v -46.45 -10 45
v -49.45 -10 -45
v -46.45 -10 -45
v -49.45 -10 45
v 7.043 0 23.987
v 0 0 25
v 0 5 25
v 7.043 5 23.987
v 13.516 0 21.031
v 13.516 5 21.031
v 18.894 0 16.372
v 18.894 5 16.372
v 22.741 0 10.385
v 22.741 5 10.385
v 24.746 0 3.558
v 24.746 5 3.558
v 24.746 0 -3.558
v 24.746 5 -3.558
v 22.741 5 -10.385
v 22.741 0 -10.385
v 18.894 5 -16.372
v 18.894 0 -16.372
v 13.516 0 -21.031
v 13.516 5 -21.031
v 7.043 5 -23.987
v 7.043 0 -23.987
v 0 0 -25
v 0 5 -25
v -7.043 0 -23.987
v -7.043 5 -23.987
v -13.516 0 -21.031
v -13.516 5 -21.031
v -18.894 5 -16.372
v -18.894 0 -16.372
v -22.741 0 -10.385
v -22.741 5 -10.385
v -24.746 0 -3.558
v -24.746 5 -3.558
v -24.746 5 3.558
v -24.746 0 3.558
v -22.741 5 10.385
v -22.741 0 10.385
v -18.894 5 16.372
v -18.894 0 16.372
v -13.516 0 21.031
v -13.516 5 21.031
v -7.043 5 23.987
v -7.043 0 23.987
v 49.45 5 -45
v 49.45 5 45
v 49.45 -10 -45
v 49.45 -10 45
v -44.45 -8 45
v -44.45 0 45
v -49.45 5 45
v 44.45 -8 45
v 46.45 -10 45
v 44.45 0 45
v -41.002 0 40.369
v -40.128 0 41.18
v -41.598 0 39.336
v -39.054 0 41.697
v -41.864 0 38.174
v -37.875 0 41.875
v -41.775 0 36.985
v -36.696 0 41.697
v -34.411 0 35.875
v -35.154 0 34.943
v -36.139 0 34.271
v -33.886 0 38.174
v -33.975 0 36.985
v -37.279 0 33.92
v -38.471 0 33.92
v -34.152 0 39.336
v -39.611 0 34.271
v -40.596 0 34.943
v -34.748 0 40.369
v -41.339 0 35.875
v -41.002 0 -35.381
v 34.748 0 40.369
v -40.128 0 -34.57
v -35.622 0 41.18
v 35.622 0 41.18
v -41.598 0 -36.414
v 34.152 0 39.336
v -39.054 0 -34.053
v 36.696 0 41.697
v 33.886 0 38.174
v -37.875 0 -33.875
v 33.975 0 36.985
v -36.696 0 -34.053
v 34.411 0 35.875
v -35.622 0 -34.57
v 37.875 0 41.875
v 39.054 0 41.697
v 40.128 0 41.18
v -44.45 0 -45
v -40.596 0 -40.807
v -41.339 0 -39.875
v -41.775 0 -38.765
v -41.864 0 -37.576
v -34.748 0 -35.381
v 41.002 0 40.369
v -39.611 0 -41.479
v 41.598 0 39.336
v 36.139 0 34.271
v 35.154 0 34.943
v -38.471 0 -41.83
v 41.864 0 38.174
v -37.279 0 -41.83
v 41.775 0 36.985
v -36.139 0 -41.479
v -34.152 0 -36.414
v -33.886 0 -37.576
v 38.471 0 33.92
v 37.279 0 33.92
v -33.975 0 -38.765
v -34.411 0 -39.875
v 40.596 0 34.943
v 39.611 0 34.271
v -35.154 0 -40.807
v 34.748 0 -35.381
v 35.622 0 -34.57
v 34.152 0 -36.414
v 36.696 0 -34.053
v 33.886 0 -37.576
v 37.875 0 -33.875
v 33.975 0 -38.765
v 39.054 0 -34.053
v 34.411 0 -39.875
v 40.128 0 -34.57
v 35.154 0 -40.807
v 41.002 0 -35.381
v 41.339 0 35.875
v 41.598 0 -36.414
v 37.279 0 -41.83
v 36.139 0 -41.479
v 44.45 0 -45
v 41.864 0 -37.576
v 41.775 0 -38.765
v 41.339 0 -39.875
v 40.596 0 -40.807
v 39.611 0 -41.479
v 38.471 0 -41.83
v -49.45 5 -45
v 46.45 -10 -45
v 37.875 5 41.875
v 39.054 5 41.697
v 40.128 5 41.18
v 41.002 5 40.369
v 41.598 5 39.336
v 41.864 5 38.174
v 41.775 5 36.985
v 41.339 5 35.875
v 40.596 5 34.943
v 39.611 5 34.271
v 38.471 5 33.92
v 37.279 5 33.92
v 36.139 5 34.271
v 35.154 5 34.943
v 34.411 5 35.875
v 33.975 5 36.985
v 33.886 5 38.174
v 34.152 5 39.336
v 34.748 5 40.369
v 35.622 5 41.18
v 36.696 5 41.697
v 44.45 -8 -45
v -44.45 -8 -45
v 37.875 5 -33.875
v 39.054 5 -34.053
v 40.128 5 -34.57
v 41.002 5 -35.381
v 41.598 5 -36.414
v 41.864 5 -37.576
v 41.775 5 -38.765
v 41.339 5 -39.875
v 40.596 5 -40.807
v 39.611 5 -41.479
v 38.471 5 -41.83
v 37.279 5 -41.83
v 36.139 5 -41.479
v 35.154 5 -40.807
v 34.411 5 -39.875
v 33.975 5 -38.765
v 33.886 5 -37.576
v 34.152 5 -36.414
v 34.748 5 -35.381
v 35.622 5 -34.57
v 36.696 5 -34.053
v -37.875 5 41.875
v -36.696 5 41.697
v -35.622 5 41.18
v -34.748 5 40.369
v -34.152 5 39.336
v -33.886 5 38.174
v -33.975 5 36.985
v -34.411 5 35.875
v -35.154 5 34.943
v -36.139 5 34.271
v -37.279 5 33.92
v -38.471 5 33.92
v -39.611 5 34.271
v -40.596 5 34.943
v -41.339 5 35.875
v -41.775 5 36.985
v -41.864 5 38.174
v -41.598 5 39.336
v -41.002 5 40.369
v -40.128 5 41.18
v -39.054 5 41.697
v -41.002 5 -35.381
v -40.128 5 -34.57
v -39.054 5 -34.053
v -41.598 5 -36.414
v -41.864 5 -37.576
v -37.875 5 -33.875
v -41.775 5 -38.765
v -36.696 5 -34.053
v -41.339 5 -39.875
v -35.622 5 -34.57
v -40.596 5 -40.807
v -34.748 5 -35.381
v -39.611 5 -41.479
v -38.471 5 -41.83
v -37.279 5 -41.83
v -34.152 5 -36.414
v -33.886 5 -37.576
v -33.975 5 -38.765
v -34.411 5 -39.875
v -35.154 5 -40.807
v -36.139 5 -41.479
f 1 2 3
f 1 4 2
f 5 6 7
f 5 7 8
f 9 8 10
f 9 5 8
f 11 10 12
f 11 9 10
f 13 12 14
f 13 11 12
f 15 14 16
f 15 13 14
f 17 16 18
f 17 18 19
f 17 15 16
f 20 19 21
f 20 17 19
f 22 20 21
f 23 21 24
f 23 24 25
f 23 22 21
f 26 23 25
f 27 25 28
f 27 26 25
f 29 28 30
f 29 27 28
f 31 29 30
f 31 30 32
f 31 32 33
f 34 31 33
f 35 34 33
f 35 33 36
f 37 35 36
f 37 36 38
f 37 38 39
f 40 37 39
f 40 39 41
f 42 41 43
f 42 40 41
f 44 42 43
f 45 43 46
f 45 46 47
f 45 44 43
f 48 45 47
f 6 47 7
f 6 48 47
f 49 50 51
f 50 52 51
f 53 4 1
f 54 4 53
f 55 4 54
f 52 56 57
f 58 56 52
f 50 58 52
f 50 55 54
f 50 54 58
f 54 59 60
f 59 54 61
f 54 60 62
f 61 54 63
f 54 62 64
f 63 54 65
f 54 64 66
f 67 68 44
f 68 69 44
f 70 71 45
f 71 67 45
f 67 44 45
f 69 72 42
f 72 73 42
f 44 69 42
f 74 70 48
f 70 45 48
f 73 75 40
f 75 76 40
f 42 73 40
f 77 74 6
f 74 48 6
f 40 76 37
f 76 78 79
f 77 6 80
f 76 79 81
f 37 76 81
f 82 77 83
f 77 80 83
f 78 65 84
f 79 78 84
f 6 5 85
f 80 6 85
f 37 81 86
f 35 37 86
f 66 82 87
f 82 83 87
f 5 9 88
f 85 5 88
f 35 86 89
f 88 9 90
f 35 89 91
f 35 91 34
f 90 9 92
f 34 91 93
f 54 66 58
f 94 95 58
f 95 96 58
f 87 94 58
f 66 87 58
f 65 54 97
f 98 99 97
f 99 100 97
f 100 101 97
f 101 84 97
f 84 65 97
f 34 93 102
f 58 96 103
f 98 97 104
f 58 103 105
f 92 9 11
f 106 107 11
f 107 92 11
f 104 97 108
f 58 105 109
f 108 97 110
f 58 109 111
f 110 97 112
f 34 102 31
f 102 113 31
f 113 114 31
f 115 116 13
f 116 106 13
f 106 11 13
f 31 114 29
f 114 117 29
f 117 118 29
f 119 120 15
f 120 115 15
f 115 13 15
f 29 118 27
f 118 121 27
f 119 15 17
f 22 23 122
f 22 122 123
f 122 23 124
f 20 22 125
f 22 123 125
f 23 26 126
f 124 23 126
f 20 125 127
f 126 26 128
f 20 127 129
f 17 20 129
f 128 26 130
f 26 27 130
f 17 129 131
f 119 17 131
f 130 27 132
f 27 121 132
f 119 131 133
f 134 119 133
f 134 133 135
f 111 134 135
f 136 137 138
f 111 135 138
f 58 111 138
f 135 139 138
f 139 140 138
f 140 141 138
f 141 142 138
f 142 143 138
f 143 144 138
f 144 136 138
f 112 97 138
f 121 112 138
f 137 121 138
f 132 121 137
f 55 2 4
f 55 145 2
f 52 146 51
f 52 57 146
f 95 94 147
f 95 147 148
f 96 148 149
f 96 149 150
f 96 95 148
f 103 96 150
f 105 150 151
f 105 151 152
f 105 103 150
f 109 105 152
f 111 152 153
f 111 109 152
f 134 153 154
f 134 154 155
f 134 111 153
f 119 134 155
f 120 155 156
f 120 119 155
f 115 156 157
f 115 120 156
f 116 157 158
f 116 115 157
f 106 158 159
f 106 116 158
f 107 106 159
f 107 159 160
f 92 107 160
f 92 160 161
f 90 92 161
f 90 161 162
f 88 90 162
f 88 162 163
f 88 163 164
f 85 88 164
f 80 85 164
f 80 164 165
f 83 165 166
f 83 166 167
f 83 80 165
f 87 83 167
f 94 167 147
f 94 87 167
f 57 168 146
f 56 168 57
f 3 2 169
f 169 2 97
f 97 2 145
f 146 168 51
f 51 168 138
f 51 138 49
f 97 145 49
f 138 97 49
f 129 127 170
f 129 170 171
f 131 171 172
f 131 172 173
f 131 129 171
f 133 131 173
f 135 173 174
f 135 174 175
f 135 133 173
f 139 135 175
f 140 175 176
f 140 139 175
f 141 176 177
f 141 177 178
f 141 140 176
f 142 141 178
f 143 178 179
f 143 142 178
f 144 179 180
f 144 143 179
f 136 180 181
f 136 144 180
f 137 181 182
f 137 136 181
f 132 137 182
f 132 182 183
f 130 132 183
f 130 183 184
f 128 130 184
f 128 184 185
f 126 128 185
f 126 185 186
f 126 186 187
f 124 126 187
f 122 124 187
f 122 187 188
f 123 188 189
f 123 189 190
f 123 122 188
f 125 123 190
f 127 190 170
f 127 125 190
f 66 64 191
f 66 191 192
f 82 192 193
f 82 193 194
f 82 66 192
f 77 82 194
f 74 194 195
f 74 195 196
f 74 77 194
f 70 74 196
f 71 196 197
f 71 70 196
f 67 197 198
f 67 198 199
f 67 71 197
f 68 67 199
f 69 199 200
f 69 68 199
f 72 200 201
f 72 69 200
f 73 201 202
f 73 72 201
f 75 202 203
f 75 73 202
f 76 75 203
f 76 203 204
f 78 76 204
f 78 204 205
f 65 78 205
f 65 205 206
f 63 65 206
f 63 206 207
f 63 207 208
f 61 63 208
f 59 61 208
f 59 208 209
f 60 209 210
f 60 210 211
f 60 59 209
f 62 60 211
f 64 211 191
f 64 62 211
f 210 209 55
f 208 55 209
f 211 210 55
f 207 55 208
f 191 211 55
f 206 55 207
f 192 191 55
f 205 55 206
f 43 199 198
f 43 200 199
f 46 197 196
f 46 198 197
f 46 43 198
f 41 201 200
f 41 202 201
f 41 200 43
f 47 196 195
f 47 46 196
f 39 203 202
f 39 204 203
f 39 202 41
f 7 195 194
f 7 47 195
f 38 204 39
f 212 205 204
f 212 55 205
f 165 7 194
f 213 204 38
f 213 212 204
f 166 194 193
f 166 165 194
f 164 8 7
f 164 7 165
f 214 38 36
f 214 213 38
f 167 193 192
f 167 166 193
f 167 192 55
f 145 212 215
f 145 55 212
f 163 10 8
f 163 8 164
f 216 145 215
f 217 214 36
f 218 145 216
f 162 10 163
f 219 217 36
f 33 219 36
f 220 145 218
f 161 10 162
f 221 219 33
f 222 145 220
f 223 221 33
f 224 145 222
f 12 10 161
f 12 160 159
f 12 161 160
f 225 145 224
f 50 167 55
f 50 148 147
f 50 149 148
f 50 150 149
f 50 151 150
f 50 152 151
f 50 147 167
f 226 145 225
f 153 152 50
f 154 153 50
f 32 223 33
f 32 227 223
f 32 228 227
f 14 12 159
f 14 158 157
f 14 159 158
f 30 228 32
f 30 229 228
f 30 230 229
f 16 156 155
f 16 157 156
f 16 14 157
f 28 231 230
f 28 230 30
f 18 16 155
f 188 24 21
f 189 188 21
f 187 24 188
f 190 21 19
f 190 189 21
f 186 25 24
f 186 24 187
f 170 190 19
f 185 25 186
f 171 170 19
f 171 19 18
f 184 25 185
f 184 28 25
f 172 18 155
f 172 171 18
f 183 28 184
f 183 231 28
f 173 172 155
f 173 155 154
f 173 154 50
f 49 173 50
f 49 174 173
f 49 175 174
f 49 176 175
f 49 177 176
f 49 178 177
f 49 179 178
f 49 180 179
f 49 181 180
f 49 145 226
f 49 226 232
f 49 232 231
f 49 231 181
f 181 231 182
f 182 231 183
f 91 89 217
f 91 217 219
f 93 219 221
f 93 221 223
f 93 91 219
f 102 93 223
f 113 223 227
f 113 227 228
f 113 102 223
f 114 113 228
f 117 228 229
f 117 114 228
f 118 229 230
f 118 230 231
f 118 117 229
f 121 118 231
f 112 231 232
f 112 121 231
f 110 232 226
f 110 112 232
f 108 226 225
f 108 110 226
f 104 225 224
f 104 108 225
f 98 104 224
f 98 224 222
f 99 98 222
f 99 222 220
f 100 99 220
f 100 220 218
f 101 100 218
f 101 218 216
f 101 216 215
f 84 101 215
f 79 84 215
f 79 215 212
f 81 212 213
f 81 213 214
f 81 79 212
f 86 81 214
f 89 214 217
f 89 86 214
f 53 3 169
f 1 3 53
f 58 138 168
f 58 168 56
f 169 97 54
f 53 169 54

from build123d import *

# Parameters (mm, degrees)
SKETCH1_W           = 98.9
SKETCH1_H           = 90
SKETCH1_R           = 4
SKETCH1_R_2         = 25
BOSS_EXTRUDE1_DEPTH = 5
SKETCH2_W           = 5
SKETCH2_H           = 90
BOSS_EXTRUDE2_DEPTH = 10
CHAMFER1_SIZE       = 2


with BuildPart() as part:
    # Sketch1 → Boss-Extrude1 (new body)
    with BuildSketch(Plane(origin=(0, 0, 0), x_dir=(1, 0, 0), z_dir=(0, 1, 0))):
        Rectangle(SKETCH1_W, SKETCH1_H)
        with Locations(Location((37.875, -37.875, 0), (0, 0, 270))):
            Circle(SKETCH1_R, mode=Mode.SUBTRACT)
        with Locations(Location((-37.875, -37.875, 0), (0, 0, 270))):
            Circle(SKETCH1_R, mode=Mode.SUBTRACT)
        with Locations(Location((37.875, 37.875, 0), (0, 0, 270))):
            Circle(SKETCH1_R, mode=Mode.SUBTRACT)
        with Locations(Location((-37.875, 37.875, 0), (0, 0, 270))):
            Circle(SKETCH1_R, mode=Mode.SUBTRACT)
        with Locations(Location((0, 0, 0), (0, 0, 270))):
            Circle(SKETCH1_R_2, mode=Mode.SUBTRACT)
    extrude(amount=BOSS_EXTRUDE1_DEPTH)

    # Sketch2 → Boss-Extrude2 (add)
    with BuildSketch(Plane.XZ):
        with Locations((-46.95, 0)):
            Rectangle(SKETCH2_W, SKETCH2_H)
        with Locations((46.95, 0)):
            Rectangle(SKETCH2_W, SKETCH2_H)
    extrude(amount=BOSS_EXTRUDE2_DEPTH)

    # Chamfer1
    chamfer1_edges = [part.edges().sort_by_distance(p)[0] for p in [
        (-44.45, -10, 0),
        (44.45, -10, 0),
    ]]
    chamfer(chamfer1_edges, length=CHAMFER1_SIZE)


solid = part.part
